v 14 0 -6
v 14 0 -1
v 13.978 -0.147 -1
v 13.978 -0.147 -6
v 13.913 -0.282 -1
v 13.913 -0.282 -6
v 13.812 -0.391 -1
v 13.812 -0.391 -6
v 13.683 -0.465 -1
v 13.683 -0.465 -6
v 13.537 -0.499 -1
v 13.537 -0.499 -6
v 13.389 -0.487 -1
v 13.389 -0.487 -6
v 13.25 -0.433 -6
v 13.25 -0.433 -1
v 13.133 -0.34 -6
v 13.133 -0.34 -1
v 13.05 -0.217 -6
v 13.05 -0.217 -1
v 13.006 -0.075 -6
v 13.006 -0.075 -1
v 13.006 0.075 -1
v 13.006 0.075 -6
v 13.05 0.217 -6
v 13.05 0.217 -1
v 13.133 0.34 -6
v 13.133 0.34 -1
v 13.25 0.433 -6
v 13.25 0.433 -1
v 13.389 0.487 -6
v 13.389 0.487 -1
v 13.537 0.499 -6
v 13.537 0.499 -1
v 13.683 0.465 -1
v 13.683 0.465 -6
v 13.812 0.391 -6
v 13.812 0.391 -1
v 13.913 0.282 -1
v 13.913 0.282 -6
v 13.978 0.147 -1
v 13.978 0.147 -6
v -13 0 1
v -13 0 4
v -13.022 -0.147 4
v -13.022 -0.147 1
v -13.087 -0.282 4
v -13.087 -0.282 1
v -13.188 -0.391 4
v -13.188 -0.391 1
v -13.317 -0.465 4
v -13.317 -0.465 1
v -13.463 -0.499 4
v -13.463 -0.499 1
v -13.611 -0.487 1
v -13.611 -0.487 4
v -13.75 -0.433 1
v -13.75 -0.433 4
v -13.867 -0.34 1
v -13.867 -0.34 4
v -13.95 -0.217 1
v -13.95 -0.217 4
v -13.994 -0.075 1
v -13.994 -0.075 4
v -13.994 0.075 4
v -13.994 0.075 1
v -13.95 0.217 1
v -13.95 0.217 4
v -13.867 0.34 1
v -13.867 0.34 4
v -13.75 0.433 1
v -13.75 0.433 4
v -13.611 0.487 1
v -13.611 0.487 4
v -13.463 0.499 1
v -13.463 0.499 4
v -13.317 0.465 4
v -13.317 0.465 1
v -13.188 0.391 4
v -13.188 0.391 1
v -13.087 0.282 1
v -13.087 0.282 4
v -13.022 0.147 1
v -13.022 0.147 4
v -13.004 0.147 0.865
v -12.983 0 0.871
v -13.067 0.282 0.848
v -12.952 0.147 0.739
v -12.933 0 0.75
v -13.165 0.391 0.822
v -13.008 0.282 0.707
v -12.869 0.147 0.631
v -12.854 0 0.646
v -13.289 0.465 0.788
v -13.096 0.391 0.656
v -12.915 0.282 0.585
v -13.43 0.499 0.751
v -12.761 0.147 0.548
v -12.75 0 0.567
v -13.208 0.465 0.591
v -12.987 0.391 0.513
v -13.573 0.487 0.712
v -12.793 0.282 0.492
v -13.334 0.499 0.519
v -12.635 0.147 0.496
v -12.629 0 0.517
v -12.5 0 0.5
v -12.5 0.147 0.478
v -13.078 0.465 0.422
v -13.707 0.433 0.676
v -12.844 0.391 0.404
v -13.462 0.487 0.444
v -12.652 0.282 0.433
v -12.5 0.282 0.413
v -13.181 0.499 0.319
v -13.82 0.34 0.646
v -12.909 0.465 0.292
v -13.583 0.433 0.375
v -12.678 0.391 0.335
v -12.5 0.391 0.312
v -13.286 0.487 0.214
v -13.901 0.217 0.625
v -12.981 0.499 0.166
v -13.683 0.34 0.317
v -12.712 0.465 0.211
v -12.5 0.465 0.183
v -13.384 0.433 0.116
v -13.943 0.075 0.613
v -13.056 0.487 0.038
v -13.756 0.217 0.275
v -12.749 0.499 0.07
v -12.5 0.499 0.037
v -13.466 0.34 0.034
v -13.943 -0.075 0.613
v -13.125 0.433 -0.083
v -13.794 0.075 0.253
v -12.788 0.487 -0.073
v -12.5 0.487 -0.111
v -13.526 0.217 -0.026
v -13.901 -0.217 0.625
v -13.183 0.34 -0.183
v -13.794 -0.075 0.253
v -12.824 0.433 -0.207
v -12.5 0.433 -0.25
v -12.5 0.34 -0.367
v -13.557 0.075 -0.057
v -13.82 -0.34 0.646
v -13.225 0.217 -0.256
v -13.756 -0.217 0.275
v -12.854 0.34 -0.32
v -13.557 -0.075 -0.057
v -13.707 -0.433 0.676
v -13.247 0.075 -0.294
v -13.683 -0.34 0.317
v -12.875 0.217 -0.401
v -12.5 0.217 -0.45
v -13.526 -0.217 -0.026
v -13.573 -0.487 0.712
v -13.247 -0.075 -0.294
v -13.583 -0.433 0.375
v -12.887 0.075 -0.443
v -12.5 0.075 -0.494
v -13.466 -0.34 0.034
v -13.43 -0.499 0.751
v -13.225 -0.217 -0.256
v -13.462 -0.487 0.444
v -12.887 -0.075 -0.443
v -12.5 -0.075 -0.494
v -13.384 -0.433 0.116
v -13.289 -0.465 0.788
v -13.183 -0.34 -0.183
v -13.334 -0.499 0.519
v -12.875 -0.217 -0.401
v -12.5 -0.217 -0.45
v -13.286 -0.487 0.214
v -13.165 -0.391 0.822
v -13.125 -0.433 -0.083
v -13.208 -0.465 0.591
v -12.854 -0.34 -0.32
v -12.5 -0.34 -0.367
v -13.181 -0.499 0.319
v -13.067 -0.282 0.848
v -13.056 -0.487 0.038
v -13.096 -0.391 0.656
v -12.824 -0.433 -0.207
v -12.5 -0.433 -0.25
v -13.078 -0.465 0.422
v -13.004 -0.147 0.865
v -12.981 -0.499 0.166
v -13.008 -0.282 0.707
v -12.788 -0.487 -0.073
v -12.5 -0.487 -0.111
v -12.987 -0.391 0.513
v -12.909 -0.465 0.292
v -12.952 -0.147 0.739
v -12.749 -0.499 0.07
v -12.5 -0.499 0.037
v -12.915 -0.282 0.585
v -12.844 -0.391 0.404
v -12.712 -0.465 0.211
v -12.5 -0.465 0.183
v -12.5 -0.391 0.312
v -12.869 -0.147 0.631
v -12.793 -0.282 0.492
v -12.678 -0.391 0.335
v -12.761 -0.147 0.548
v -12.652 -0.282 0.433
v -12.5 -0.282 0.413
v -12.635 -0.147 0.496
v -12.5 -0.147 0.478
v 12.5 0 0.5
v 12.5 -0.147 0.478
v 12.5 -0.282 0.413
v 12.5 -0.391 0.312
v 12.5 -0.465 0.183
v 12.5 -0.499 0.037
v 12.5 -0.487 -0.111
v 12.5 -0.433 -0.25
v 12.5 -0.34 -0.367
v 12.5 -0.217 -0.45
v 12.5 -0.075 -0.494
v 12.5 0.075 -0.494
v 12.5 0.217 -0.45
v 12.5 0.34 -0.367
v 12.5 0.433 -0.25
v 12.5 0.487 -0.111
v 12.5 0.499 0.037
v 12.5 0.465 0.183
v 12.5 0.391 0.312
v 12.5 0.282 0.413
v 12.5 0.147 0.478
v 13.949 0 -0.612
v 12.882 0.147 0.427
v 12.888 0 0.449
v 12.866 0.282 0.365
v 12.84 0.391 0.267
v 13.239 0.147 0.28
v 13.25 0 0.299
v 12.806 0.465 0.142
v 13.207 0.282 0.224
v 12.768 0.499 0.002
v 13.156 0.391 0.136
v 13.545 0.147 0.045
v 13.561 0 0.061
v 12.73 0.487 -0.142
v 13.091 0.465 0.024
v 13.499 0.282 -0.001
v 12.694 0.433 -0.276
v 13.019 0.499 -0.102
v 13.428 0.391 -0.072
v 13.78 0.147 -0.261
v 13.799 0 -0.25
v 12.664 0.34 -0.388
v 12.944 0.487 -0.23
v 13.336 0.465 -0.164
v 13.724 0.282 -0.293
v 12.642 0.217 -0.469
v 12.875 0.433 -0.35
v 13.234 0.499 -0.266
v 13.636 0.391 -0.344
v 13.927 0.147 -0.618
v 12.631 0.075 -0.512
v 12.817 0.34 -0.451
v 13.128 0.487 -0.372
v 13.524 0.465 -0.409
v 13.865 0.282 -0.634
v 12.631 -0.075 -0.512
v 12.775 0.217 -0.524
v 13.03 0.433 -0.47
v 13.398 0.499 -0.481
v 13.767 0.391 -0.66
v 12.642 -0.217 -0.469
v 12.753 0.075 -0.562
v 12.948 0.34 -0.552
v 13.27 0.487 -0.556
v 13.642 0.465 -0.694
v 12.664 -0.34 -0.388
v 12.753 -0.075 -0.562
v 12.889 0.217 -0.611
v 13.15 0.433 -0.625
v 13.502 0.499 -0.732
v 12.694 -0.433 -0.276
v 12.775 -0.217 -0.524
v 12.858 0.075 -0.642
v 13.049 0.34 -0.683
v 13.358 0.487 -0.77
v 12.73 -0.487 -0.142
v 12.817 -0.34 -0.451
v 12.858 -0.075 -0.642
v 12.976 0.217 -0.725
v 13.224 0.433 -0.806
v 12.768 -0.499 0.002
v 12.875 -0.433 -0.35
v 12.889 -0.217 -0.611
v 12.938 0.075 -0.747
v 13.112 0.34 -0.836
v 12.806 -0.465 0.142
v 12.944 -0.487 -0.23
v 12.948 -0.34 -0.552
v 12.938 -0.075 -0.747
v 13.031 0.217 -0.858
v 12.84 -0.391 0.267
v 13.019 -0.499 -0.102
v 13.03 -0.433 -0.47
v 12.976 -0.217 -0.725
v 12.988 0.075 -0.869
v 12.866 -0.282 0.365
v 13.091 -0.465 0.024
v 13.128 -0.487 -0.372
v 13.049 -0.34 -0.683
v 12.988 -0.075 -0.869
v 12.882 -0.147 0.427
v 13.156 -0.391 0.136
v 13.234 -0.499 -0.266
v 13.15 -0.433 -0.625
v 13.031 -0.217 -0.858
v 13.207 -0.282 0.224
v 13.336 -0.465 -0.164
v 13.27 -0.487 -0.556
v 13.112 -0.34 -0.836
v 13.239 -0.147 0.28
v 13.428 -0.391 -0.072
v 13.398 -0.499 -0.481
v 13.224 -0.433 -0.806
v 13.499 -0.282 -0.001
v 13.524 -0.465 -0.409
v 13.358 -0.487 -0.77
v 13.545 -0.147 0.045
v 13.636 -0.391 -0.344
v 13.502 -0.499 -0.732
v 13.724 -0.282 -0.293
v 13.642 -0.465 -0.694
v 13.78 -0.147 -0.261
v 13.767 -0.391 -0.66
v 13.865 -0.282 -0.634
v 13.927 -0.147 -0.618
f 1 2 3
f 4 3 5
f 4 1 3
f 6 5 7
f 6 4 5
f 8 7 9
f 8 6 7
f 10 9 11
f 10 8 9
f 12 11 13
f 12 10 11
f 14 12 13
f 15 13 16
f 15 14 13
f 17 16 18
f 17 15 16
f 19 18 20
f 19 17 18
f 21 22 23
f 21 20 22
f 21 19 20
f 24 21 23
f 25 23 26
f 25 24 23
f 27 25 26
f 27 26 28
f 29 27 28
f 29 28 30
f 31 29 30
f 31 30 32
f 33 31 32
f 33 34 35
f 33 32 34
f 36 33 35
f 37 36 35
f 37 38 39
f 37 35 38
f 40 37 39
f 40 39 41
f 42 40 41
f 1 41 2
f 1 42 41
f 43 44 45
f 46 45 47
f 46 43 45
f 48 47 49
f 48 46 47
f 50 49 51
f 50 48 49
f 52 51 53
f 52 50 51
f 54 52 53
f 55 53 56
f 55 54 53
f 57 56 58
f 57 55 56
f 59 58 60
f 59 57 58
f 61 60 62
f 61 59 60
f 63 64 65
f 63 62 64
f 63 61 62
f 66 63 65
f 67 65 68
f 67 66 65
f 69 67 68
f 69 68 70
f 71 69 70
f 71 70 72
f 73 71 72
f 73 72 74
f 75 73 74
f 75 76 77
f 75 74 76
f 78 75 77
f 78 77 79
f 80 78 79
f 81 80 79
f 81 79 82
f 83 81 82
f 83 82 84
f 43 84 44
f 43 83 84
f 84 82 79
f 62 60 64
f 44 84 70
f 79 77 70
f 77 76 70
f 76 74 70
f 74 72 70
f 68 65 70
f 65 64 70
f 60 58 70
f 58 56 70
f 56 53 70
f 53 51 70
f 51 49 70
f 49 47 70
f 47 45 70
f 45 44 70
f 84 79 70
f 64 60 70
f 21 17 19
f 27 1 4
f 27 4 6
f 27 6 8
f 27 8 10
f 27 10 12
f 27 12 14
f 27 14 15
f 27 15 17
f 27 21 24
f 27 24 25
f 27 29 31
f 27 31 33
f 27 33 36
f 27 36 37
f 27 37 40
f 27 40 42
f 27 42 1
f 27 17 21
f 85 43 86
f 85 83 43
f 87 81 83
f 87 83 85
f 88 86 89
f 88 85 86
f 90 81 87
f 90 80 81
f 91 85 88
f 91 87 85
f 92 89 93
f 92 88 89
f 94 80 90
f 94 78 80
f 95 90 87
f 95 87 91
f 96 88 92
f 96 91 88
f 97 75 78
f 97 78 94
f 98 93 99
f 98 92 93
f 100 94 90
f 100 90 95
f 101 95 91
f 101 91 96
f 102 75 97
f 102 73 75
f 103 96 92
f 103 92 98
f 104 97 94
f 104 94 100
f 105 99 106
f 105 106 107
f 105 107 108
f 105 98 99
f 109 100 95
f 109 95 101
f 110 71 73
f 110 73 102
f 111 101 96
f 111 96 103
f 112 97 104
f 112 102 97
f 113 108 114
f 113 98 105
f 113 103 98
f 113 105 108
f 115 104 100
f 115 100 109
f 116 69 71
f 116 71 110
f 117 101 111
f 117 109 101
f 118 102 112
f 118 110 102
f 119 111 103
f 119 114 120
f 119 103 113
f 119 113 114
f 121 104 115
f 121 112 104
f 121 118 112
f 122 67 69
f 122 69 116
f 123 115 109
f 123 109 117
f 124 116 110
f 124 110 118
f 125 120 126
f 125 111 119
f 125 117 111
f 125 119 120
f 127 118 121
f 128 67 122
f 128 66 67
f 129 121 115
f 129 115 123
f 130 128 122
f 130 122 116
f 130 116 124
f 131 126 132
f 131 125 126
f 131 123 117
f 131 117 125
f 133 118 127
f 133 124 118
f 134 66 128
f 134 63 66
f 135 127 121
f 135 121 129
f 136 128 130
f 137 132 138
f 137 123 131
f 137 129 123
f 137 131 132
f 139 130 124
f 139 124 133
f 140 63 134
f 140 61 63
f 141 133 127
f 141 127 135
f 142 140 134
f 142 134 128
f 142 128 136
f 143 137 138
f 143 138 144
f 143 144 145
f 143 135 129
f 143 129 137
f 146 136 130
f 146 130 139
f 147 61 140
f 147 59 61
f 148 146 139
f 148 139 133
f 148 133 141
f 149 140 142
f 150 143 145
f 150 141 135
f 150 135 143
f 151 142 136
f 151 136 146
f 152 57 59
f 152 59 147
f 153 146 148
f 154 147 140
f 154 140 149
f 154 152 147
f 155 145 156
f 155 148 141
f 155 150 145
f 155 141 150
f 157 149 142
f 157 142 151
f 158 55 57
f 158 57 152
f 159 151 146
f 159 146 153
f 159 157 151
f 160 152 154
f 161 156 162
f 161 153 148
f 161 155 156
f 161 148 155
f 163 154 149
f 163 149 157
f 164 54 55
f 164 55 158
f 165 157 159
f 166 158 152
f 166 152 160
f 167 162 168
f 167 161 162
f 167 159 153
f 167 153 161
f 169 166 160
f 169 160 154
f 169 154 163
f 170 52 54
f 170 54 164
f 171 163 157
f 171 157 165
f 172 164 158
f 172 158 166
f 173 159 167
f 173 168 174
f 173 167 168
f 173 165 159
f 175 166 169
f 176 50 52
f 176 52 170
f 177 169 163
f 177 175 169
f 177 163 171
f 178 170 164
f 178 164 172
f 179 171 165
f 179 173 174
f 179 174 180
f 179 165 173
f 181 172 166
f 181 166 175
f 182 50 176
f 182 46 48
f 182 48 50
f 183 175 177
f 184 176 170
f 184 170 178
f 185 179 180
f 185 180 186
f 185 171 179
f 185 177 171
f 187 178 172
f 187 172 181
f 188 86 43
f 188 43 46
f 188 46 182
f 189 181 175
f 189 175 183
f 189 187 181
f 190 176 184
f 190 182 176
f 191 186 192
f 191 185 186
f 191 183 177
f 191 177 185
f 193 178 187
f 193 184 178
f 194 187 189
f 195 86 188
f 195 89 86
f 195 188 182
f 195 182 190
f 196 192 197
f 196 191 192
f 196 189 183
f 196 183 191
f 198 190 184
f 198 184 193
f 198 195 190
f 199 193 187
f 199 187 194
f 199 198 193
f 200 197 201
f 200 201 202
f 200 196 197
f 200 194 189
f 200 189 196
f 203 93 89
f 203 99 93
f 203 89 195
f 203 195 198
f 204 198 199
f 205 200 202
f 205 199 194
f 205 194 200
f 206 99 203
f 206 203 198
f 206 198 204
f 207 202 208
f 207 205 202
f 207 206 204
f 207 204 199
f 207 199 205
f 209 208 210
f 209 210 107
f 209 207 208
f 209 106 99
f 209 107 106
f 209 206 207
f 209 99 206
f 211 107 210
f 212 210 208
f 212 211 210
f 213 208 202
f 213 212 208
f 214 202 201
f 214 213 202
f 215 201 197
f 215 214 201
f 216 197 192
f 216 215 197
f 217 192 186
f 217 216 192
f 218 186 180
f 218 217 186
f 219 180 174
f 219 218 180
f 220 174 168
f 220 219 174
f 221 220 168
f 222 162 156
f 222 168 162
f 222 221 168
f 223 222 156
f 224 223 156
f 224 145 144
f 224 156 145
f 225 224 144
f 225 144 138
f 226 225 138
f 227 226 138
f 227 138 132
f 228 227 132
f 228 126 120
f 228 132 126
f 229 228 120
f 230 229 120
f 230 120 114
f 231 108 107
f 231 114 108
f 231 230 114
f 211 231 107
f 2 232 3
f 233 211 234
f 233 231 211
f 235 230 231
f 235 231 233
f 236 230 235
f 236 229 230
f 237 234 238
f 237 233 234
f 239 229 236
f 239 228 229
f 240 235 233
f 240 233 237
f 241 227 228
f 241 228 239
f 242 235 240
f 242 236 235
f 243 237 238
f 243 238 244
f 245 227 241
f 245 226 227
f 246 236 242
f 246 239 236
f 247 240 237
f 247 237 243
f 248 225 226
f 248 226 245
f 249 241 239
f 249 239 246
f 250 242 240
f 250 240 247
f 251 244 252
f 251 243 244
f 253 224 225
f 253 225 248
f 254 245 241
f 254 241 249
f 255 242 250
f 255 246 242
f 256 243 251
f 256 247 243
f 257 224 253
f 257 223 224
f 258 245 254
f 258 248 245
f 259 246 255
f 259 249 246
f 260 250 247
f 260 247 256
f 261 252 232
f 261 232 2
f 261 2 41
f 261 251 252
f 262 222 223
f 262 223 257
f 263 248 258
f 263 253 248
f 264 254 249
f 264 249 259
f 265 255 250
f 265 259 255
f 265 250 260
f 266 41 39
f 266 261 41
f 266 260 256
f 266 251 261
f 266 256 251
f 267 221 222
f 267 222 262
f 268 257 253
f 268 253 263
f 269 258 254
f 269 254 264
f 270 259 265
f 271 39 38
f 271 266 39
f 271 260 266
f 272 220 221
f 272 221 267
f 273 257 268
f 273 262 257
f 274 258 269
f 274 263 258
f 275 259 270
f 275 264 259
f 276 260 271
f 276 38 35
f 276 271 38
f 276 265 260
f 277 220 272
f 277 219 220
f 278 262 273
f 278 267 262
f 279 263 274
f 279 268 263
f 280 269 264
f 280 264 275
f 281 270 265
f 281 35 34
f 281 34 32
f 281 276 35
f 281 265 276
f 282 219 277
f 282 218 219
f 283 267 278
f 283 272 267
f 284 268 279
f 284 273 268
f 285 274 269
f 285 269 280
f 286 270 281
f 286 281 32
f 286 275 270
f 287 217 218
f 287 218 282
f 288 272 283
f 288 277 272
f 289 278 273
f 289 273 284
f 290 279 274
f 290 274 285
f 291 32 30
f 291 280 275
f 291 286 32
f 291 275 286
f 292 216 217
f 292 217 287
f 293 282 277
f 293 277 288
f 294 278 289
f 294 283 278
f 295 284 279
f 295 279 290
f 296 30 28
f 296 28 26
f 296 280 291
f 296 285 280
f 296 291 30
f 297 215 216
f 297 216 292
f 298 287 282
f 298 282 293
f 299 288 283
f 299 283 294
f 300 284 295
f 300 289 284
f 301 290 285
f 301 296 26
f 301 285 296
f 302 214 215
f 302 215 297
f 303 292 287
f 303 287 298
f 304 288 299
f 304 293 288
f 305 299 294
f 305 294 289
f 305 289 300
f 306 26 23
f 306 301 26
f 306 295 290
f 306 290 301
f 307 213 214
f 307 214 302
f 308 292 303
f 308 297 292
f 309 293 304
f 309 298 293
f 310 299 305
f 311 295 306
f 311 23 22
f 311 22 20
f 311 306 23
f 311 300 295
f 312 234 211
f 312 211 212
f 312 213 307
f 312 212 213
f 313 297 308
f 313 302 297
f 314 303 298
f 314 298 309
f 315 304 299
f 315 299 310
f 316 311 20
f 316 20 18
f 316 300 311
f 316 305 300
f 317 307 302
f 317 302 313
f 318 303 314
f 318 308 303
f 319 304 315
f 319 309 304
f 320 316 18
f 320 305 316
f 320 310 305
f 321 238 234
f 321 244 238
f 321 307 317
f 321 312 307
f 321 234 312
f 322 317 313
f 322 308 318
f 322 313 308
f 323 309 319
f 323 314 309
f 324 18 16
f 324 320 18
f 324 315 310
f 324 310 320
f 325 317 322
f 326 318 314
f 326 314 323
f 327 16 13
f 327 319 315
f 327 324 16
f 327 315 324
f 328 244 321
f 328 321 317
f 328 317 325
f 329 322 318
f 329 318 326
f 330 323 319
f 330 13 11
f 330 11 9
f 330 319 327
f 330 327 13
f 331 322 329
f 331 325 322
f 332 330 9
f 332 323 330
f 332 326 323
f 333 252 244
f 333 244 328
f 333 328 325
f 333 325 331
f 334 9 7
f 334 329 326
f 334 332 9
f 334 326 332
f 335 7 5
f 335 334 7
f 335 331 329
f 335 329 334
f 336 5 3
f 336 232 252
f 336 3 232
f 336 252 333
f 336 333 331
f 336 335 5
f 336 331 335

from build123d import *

# Parameters (mm, degrees)
F0_W      = 0.5
F0_H      = 1
F1_FACE_R = 0.5


with BuildPart() as f1:
    # F0 (on Front) → F1 (revolve)
    with BuildSketch(Plane.XZ):
        with Locations((-13.25, 3.5)):
            Rectangle(F0_W, F0_H)
    revolve(axis=Axis((-13.5, 0, 3.5), (0, 0, 1)))

    # F2: sweep along a path in F0
    with BuildLine(Plane.XZ) as f2_path:
        Line((-13.5, 3), (-13.5, 1))
        ThreePointArc((-13.5, 1), (-13.2071067812, 0.2928932188), (-12.5, 0))
        Line((-12.5, 0), (12.5, 0))
        ThreePointArc((12.5, 0), (13.2071067812, -0.2928932188), (13.5, -1))
        Line((13.5, -1), (13.5, -6))
    # F1_face (on face) → F2 (sweep)
    with BuildSketch(Plane(origin=(-13.5, 0, 3), x_dir=(1, 0, 0), z_dir=(0, 0, -1))):
        Circle(F1_FACE_R)
    sweep(path=f2_path.line)


solid = f1.part
